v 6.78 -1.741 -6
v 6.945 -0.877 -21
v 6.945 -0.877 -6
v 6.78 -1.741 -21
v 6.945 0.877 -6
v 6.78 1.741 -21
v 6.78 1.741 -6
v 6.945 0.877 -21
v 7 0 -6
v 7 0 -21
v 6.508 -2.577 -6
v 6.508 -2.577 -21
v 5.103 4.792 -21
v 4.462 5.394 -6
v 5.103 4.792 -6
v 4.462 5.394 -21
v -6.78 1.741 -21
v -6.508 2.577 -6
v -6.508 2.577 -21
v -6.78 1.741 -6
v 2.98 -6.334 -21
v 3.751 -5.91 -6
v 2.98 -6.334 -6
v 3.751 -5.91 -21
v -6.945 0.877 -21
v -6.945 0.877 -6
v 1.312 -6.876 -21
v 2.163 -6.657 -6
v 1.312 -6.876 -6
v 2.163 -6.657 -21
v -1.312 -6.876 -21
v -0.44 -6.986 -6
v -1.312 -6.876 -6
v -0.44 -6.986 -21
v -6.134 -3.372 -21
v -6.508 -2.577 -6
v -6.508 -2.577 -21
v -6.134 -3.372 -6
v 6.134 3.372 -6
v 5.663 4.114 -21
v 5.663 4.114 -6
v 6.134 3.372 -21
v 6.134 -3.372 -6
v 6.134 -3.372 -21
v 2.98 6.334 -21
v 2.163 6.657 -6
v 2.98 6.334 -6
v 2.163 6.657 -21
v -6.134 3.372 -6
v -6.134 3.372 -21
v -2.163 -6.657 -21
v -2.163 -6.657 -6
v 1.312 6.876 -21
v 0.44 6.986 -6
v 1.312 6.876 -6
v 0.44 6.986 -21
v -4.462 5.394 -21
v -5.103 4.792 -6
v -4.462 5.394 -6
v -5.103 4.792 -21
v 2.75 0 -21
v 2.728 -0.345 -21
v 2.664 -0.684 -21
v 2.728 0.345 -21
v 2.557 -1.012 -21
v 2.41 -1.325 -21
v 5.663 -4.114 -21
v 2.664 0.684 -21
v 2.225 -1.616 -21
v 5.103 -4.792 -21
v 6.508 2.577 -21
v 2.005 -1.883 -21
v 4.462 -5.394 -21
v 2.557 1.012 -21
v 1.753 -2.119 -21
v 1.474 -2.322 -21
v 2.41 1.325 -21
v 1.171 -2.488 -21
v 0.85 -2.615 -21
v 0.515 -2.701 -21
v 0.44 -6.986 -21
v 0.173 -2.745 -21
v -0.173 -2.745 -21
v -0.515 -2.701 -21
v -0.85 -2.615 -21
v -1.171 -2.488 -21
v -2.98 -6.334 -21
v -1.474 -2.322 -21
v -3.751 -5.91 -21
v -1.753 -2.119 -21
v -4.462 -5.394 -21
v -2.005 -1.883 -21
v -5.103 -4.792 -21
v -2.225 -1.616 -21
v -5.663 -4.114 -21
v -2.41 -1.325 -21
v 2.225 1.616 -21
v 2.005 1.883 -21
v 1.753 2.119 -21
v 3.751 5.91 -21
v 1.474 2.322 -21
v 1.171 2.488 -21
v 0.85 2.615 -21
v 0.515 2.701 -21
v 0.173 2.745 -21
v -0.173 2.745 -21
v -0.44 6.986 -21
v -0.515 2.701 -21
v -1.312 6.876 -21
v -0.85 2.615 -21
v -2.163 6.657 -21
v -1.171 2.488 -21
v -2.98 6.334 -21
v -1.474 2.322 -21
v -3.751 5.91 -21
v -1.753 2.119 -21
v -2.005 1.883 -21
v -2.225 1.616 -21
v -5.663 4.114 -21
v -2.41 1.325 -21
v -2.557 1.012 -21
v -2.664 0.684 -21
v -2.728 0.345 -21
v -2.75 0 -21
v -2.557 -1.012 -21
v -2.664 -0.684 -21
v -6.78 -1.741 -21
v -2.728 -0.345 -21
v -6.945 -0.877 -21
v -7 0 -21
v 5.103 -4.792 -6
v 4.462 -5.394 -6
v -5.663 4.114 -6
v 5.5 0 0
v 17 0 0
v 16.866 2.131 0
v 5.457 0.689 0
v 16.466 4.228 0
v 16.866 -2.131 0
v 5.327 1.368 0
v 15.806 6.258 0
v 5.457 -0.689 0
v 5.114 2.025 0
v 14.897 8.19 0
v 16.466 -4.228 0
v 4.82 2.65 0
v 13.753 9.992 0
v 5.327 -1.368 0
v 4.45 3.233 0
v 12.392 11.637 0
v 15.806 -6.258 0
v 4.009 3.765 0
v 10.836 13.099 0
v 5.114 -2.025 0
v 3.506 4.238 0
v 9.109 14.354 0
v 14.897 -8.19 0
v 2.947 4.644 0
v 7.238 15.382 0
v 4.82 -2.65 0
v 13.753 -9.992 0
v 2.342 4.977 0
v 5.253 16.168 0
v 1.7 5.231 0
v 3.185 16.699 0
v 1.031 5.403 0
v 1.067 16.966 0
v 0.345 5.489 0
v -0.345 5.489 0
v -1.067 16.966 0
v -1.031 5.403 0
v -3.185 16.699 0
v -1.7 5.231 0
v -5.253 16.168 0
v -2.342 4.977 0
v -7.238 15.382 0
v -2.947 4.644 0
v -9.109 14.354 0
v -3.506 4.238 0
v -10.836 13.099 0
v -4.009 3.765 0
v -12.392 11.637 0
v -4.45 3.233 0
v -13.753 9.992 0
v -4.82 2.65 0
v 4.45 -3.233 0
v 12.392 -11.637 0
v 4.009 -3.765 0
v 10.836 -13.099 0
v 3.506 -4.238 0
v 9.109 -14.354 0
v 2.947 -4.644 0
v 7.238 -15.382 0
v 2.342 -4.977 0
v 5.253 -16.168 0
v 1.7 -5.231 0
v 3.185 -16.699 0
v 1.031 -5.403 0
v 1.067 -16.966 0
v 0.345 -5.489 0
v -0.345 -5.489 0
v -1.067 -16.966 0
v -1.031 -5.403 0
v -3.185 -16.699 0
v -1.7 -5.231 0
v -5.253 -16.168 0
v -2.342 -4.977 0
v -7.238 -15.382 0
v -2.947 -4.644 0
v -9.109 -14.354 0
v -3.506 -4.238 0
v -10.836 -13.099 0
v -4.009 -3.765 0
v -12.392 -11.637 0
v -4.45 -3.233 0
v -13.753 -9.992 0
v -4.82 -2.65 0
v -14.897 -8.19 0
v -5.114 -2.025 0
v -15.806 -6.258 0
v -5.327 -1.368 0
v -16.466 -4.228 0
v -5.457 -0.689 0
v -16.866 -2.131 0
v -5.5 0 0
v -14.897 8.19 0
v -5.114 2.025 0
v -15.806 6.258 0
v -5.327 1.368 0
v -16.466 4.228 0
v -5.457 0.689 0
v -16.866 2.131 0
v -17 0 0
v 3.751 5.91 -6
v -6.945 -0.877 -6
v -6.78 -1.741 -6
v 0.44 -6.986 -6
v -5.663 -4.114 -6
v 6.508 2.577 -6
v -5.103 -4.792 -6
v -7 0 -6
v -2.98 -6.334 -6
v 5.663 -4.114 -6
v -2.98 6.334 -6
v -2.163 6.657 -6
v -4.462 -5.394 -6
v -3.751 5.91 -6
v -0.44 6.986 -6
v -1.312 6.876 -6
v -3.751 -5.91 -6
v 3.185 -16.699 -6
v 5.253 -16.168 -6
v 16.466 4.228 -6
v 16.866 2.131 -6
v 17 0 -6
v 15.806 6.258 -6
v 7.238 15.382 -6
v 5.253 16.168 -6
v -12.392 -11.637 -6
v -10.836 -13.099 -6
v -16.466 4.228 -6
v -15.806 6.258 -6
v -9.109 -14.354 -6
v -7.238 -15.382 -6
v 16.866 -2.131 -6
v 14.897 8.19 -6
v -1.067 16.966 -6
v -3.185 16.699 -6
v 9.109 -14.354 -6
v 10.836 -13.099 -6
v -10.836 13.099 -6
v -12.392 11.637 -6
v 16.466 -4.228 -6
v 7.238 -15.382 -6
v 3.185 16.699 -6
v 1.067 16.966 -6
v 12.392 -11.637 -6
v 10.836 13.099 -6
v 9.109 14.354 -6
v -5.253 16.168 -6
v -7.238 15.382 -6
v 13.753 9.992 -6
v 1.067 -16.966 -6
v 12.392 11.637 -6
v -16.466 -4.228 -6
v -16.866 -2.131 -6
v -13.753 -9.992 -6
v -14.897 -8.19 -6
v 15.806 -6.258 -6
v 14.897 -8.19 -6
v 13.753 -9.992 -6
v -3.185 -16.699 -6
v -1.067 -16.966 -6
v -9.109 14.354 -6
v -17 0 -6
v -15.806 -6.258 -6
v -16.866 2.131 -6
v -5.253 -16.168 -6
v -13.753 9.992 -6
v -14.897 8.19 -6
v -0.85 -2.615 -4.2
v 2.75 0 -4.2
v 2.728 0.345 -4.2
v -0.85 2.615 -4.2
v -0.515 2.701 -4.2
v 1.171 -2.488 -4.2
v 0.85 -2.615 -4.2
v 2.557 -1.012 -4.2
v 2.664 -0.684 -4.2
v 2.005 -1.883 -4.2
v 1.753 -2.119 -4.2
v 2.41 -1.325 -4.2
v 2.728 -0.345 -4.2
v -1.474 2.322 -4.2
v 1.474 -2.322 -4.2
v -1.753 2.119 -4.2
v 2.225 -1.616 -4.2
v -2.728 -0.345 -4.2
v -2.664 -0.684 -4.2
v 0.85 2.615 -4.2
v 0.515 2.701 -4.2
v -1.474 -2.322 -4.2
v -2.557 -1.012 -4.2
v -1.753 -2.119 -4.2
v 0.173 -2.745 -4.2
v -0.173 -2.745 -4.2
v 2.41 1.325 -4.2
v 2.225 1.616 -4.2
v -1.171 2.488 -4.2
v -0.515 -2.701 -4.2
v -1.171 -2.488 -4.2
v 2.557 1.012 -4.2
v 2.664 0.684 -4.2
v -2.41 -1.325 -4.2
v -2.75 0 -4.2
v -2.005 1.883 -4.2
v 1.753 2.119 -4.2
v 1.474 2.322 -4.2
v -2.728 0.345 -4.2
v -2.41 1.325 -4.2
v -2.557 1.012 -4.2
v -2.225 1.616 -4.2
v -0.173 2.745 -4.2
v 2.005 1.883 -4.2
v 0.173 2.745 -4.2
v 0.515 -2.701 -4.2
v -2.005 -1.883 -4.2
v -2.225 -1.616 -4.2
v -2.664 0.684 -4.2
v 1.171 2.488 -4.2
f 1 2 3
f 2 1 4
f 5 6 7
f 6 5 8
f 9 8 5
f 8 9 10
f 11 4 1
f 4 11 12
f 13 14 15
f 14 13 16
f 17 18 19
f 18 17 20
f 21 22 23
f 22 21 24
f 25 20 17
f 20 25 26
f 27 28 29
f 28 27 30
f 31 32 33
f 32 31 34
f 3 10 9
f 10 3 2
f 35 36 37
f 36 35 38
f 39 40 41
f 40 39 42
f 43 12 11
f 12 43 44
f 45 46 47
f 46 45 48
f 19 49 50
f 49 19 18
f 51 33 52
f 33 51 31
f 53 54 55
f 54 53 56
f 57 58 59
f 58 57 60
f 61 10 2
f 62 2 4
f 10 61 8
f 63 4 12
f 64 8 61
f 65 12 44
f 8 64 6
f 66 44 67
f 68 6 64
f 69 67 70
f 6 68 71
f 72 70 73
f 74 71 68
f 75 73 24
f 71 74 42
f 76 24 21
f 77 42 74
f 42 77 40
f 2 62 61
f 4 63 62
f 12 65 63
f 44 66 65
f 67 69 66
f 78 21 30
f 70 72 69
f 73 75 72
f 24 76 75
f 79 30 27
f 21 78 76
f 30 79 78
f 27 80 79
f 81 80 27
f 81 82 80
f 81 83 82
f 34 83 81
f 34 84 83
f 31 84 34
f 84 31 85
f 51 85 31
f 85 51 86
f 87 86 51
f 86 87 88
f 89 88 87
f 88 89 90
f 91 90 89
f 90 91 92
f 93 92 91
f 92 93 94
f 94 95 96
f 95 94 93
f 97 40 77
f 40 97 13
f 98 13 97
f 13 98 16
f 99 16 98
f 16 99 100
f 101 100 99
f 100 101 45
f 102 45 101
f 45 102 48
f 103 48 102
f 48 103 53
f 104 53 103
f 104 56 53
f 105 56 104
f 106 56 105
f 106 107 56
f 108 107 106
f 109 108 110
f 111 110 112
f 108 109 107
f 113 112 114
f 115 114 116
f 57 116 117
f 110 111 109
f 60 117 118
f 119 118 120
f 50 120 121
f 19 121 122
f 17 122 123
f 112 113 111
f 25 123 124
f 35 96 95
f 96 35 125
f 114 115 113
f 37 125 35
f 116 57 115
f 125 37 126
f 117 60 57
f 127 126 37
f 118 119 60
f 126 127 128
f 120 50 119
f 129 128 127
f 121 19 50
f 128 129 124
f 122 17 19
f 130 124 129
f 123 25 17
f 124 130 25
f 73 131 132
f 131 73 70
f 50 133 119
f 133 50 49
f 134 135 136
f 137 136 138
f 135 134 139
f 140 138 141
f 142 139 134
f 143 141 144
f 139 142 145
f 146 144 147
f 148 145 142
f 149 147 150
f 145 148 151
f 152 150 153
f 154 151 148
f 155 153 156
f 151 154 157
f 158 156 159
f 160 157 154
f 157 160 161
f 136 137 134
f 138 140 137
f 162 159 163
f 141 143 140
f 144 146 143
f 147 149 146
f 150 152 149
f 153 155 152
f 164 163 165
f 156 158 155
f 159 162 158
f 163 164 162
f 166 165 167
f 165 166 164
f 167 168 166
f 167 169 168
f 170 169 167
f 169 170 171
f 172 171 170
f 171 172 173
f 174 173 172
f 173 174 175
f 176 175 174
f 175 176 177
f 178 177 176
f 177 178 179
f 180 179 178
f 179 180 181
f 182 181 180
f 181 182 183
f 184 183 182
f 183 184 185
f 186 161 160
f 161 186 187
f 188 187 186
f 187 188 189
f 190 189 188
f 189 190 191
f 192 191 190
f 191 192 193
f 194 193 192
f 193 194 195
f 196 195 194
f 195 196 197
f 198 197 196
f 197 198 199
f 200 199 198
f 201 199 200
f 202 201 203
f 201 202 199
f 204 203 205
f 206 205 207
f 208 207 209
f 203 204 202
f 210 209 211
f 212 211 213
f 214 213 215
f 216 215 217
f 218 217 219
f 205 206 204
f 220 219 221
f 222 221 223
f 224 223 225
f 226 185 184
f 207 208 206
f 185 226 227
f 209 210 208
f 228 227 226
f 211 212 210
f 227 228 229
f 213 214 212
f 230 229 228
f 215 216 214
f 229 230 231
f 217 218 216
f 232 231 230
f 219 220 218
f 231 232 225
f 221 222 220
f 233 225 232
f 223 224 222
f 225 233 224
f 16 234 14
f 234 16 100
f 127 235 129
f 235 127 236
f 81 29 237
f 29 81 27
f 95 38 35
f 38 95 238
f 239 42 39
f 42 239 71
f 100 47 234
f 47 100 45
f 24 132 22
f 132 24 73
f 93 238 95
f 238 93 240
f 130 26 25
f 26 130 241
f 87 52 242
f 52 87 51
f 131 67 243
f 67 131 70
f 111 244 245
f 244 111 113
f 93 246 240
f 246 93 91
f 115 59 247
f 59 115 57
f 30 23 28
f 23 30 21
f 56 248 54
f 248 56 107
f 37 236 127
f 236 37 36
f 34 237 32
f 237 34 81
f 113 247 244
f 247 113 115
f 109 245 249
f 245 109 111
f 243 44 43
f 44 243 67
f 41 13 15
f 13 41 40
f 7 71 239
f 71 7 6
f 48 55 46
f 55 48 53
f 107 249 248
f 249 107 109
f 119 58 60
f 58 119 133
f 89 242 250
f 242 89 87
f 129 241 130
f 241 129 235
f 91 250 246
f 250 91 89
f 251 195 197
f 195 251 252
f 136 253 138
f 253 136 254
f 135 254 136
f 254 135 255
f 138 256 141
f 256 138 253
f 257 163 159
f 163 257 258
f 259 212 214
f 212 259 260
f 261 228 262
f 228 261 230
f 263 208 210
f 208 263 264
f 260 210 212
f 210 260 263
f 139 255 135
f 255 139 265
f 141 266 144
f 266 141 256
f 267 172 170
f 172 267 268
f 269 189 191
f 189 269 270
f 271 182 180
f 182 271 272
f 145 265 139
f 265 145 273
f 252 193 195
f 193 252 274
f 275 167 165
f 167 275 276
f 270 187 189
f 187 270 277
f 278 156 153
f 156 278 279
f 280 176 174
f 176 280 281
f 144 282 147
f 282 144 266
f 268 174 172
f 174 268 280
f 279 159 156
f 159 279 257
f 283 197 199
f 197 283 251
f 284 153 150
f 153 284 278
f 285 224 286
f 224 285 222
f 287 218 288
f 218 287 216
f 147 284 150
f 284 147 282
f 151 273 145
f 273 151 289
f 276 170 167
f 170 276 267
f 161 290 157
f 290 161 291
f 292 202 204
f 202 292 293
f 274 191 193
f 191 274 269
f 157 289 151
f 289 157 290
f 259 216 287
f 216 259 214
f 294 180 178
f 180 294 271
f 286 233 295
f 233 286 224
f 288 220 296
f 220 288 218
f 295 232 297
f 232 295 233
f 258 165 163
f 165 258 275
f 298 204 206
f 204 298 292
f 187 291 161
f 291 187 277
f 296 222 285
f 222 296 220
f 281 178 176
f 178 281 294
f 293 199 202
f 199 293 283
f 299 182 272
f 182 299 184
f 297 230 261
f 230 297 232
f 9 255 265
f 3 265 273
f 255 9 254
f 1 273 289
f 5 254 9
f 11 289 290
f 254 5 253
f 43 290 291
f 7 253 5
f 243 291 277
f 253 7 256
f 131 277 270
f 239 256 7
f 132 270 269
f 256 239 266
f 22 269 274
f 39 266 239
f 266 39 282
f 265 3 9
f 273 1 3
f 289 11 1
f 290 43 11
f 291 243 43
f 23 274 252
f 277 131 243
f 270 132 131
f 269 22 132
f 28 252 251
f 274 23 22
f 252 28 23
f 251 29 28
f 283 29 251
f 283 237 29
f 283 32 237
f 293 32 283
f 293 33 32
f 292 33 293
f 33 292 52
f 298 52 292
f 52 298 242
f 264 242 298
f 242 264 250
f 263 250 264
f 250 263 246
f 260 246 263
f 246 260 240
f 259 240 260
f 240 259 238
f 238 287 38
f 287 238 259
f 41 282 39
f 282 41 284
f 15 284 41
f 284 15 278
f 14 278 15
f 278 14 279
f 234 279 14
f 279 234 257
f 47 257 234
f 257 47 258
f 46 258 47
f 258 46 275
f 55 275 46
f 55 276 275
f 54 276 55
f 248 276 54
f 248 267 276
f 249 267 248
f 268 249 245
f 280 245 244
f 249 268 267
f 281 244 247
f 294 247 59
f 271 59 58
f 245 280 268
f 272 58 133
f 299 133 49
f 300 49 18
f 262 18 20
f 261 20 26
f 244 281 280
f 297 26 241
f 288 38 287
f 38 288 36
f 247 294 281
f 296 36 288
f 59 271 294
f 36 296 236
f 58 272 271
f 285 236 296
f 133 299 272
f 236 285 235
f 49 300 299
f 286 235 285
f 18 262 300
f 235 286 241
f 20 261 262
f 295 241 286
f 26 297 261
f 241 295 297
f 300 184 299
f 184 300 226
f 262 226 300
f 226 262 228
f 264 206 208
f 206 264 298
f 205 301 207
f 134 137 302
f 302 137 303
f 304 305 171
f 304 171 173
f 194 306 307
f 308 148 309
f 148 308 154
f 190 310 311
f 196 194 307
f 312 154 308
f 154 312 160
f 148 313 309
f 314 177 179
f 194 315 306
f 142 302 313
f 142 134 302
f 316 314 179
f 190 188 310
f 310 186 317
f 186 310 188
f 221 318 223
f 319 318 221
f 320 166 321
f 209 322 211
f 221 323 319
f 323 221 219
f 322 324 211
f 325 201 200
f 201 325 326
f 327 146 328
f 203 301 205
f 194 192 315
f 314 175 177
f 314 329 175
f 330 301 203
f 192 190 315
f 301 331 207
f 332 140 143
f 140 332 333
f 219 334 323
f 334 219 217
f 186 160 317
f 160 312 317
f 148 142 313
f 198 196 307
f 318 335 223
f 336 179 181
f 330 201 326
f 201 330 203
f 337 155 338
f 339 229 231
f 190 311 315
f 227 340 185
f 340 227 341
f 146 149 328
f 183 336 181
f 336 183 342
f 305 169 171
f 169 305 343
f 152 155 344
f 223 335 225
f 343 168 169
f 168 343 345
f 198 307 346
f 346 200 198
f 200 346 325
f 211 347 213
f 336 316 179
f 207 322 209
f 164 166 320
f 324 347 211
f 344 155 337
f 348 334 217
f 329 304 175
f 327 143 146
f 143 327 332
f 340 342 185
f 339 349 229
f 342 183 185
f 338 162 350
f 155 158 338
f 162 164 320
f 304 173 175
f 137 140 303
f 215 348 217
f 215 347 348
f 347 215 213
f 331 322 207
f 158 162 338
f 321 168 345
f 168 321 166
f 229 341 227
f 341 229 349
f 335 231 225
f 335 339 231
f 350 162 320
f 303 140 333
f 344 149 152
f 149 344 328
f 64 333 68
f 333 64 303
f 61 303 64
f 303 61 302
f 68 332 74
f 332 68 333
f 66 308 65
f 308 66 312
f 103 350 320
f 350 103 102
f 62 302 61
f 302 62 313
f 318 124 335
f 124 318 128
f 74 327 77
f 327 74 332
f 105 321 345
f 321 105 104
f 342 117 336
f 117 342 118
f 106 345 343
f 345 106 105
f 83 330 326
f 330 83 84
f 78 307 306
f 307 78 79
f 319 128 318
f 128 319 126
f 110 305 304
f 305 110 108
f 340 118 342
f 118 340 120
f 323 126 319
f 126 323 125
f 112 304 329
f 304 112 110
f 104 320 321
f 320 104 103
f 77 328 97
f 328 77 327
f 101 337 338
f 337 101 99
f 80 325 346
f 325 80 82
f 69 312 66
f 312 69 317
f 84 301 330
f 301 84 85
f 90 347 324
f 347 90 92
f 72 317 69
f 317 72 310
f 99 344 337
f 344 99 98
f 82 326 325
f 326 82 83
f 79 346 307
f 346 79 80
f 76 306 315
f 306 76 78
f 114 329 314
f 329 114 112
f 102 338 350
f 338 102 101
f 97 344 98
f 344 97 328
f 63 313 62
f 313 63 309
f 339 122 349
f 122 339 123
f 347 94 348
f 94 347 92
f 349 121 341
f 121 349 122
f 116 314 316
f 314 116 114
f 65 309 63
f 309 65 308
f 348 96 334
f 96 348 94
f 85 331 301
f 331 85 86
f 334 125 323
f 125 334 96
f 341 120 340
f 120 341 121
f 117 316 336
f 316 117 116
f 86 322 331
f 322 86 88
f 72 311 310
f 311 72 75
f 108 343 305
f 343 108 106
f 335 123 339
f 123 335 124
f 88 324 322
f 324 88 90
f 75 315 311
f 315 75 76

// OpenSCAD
$fn = 50;


difference() {
	union() {
		translate(v = [0, 0, -21.0000000000]) {
			cylinder(h = 21, r = 7.0000000000);
		}
		translate(v = [0, 0, -6.0000000000]) {
			cylinder(h = 6, r = 17.0000000000);
		}
	}
	union() {
		translate(v = [0, 0, 0]) {
			rotate(a = [0, 0, 0]) {
				difference() {
					union() {
						#translate(v = [0, 0, -21.0000000000]) {
							cylinder(h = 21, r = 2.2500000000);
						}
						#translate(v = [0, 0, -4.2000000000]) {
							cylinder(h = 4.2000000000, r1 = 2.7500000000, r2 = 5.5000000000);
						}
						#translate(v = [0, 0, -21.0000000000]) {
							cylinder(h = 21, r = 2.7500000000);
						}
						#translate(v = [0, 0, -21.0000000000]) {
							cylinder(h = 21, r = 2.2500000000);
						}
					}
					union();
				}
			}
		}
	}
}
